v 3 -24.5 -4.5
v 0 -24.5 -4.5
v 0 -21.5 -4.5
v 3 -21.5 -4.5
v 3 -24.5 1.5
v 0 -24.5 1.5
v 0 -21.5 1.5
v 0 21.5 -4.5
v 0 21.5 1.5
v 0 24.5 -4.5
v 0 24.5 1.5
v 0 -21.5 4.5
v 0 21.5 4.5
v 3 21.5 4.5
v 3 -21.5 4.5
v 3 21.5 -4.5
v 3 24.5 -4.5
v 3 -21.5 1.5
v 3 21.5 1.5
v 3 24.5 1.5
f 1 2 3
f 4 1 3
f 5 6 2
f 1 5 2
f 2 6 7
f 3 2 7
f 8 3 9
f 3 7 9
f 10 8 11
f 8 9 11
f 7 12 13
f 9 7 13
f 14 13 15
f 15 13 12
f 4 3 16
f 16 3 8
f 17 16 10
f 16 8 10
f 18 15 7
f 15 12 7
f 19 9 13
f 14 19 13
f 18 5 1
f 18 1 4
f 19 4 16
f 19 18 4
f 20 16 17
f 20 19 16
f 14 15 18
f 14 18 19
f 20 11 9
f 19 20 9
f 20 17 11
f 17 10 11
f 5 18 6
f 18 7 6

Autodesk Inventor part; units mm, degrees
ref_plane "YZ Plane" through (0, 0, 0) normal (1, 0, 0) x (0, 1, 0)
ref_plane "XZ Plane" through (0, 0, 0) normal (0, 1, 0) x (-1, 0, 0)
ref_plane "XY Plane" through (0, 0, 0) normal (0, 0, 1) x (1, 0, 0)
sketch "Boceto1" plane through (0, 0, 0) normal (1, 0, 0) x (0, 1, 0)
  line L0 (21.5, 1.5) -> (21.5, 4.5)
  line L1 (24.5, 1.5) -> (21.5, 1.5)
  line L2 (24.5, -4.5) -> (24.5, 1.5)
  line L3 (21.5, -4.5) -> (24.5, -4.5)
  line L4 (-21.5, -4.5) -> (21.5, -4.5)
  line L5 (-24.5, -4.5) -> (-21.5, -4.5)
  line L6 (-24.5, 1.5) -> (-24.5, -4.5)
  line L7 (-21.5, 1.5) -> (-24.5, 1.5)
  line L8 (-21.5, 4.5) -> (-21.5, 1.5)
  line L9 (21.5, 4.5) -> (-21.5, 4.5)
  point P0 (0, 0)
extrude "Extrusión1" add sketch "Boceto1" along normal blind 3
properties part number "Case_Base3" material "MDF Tablero de fibras de densidad media"
